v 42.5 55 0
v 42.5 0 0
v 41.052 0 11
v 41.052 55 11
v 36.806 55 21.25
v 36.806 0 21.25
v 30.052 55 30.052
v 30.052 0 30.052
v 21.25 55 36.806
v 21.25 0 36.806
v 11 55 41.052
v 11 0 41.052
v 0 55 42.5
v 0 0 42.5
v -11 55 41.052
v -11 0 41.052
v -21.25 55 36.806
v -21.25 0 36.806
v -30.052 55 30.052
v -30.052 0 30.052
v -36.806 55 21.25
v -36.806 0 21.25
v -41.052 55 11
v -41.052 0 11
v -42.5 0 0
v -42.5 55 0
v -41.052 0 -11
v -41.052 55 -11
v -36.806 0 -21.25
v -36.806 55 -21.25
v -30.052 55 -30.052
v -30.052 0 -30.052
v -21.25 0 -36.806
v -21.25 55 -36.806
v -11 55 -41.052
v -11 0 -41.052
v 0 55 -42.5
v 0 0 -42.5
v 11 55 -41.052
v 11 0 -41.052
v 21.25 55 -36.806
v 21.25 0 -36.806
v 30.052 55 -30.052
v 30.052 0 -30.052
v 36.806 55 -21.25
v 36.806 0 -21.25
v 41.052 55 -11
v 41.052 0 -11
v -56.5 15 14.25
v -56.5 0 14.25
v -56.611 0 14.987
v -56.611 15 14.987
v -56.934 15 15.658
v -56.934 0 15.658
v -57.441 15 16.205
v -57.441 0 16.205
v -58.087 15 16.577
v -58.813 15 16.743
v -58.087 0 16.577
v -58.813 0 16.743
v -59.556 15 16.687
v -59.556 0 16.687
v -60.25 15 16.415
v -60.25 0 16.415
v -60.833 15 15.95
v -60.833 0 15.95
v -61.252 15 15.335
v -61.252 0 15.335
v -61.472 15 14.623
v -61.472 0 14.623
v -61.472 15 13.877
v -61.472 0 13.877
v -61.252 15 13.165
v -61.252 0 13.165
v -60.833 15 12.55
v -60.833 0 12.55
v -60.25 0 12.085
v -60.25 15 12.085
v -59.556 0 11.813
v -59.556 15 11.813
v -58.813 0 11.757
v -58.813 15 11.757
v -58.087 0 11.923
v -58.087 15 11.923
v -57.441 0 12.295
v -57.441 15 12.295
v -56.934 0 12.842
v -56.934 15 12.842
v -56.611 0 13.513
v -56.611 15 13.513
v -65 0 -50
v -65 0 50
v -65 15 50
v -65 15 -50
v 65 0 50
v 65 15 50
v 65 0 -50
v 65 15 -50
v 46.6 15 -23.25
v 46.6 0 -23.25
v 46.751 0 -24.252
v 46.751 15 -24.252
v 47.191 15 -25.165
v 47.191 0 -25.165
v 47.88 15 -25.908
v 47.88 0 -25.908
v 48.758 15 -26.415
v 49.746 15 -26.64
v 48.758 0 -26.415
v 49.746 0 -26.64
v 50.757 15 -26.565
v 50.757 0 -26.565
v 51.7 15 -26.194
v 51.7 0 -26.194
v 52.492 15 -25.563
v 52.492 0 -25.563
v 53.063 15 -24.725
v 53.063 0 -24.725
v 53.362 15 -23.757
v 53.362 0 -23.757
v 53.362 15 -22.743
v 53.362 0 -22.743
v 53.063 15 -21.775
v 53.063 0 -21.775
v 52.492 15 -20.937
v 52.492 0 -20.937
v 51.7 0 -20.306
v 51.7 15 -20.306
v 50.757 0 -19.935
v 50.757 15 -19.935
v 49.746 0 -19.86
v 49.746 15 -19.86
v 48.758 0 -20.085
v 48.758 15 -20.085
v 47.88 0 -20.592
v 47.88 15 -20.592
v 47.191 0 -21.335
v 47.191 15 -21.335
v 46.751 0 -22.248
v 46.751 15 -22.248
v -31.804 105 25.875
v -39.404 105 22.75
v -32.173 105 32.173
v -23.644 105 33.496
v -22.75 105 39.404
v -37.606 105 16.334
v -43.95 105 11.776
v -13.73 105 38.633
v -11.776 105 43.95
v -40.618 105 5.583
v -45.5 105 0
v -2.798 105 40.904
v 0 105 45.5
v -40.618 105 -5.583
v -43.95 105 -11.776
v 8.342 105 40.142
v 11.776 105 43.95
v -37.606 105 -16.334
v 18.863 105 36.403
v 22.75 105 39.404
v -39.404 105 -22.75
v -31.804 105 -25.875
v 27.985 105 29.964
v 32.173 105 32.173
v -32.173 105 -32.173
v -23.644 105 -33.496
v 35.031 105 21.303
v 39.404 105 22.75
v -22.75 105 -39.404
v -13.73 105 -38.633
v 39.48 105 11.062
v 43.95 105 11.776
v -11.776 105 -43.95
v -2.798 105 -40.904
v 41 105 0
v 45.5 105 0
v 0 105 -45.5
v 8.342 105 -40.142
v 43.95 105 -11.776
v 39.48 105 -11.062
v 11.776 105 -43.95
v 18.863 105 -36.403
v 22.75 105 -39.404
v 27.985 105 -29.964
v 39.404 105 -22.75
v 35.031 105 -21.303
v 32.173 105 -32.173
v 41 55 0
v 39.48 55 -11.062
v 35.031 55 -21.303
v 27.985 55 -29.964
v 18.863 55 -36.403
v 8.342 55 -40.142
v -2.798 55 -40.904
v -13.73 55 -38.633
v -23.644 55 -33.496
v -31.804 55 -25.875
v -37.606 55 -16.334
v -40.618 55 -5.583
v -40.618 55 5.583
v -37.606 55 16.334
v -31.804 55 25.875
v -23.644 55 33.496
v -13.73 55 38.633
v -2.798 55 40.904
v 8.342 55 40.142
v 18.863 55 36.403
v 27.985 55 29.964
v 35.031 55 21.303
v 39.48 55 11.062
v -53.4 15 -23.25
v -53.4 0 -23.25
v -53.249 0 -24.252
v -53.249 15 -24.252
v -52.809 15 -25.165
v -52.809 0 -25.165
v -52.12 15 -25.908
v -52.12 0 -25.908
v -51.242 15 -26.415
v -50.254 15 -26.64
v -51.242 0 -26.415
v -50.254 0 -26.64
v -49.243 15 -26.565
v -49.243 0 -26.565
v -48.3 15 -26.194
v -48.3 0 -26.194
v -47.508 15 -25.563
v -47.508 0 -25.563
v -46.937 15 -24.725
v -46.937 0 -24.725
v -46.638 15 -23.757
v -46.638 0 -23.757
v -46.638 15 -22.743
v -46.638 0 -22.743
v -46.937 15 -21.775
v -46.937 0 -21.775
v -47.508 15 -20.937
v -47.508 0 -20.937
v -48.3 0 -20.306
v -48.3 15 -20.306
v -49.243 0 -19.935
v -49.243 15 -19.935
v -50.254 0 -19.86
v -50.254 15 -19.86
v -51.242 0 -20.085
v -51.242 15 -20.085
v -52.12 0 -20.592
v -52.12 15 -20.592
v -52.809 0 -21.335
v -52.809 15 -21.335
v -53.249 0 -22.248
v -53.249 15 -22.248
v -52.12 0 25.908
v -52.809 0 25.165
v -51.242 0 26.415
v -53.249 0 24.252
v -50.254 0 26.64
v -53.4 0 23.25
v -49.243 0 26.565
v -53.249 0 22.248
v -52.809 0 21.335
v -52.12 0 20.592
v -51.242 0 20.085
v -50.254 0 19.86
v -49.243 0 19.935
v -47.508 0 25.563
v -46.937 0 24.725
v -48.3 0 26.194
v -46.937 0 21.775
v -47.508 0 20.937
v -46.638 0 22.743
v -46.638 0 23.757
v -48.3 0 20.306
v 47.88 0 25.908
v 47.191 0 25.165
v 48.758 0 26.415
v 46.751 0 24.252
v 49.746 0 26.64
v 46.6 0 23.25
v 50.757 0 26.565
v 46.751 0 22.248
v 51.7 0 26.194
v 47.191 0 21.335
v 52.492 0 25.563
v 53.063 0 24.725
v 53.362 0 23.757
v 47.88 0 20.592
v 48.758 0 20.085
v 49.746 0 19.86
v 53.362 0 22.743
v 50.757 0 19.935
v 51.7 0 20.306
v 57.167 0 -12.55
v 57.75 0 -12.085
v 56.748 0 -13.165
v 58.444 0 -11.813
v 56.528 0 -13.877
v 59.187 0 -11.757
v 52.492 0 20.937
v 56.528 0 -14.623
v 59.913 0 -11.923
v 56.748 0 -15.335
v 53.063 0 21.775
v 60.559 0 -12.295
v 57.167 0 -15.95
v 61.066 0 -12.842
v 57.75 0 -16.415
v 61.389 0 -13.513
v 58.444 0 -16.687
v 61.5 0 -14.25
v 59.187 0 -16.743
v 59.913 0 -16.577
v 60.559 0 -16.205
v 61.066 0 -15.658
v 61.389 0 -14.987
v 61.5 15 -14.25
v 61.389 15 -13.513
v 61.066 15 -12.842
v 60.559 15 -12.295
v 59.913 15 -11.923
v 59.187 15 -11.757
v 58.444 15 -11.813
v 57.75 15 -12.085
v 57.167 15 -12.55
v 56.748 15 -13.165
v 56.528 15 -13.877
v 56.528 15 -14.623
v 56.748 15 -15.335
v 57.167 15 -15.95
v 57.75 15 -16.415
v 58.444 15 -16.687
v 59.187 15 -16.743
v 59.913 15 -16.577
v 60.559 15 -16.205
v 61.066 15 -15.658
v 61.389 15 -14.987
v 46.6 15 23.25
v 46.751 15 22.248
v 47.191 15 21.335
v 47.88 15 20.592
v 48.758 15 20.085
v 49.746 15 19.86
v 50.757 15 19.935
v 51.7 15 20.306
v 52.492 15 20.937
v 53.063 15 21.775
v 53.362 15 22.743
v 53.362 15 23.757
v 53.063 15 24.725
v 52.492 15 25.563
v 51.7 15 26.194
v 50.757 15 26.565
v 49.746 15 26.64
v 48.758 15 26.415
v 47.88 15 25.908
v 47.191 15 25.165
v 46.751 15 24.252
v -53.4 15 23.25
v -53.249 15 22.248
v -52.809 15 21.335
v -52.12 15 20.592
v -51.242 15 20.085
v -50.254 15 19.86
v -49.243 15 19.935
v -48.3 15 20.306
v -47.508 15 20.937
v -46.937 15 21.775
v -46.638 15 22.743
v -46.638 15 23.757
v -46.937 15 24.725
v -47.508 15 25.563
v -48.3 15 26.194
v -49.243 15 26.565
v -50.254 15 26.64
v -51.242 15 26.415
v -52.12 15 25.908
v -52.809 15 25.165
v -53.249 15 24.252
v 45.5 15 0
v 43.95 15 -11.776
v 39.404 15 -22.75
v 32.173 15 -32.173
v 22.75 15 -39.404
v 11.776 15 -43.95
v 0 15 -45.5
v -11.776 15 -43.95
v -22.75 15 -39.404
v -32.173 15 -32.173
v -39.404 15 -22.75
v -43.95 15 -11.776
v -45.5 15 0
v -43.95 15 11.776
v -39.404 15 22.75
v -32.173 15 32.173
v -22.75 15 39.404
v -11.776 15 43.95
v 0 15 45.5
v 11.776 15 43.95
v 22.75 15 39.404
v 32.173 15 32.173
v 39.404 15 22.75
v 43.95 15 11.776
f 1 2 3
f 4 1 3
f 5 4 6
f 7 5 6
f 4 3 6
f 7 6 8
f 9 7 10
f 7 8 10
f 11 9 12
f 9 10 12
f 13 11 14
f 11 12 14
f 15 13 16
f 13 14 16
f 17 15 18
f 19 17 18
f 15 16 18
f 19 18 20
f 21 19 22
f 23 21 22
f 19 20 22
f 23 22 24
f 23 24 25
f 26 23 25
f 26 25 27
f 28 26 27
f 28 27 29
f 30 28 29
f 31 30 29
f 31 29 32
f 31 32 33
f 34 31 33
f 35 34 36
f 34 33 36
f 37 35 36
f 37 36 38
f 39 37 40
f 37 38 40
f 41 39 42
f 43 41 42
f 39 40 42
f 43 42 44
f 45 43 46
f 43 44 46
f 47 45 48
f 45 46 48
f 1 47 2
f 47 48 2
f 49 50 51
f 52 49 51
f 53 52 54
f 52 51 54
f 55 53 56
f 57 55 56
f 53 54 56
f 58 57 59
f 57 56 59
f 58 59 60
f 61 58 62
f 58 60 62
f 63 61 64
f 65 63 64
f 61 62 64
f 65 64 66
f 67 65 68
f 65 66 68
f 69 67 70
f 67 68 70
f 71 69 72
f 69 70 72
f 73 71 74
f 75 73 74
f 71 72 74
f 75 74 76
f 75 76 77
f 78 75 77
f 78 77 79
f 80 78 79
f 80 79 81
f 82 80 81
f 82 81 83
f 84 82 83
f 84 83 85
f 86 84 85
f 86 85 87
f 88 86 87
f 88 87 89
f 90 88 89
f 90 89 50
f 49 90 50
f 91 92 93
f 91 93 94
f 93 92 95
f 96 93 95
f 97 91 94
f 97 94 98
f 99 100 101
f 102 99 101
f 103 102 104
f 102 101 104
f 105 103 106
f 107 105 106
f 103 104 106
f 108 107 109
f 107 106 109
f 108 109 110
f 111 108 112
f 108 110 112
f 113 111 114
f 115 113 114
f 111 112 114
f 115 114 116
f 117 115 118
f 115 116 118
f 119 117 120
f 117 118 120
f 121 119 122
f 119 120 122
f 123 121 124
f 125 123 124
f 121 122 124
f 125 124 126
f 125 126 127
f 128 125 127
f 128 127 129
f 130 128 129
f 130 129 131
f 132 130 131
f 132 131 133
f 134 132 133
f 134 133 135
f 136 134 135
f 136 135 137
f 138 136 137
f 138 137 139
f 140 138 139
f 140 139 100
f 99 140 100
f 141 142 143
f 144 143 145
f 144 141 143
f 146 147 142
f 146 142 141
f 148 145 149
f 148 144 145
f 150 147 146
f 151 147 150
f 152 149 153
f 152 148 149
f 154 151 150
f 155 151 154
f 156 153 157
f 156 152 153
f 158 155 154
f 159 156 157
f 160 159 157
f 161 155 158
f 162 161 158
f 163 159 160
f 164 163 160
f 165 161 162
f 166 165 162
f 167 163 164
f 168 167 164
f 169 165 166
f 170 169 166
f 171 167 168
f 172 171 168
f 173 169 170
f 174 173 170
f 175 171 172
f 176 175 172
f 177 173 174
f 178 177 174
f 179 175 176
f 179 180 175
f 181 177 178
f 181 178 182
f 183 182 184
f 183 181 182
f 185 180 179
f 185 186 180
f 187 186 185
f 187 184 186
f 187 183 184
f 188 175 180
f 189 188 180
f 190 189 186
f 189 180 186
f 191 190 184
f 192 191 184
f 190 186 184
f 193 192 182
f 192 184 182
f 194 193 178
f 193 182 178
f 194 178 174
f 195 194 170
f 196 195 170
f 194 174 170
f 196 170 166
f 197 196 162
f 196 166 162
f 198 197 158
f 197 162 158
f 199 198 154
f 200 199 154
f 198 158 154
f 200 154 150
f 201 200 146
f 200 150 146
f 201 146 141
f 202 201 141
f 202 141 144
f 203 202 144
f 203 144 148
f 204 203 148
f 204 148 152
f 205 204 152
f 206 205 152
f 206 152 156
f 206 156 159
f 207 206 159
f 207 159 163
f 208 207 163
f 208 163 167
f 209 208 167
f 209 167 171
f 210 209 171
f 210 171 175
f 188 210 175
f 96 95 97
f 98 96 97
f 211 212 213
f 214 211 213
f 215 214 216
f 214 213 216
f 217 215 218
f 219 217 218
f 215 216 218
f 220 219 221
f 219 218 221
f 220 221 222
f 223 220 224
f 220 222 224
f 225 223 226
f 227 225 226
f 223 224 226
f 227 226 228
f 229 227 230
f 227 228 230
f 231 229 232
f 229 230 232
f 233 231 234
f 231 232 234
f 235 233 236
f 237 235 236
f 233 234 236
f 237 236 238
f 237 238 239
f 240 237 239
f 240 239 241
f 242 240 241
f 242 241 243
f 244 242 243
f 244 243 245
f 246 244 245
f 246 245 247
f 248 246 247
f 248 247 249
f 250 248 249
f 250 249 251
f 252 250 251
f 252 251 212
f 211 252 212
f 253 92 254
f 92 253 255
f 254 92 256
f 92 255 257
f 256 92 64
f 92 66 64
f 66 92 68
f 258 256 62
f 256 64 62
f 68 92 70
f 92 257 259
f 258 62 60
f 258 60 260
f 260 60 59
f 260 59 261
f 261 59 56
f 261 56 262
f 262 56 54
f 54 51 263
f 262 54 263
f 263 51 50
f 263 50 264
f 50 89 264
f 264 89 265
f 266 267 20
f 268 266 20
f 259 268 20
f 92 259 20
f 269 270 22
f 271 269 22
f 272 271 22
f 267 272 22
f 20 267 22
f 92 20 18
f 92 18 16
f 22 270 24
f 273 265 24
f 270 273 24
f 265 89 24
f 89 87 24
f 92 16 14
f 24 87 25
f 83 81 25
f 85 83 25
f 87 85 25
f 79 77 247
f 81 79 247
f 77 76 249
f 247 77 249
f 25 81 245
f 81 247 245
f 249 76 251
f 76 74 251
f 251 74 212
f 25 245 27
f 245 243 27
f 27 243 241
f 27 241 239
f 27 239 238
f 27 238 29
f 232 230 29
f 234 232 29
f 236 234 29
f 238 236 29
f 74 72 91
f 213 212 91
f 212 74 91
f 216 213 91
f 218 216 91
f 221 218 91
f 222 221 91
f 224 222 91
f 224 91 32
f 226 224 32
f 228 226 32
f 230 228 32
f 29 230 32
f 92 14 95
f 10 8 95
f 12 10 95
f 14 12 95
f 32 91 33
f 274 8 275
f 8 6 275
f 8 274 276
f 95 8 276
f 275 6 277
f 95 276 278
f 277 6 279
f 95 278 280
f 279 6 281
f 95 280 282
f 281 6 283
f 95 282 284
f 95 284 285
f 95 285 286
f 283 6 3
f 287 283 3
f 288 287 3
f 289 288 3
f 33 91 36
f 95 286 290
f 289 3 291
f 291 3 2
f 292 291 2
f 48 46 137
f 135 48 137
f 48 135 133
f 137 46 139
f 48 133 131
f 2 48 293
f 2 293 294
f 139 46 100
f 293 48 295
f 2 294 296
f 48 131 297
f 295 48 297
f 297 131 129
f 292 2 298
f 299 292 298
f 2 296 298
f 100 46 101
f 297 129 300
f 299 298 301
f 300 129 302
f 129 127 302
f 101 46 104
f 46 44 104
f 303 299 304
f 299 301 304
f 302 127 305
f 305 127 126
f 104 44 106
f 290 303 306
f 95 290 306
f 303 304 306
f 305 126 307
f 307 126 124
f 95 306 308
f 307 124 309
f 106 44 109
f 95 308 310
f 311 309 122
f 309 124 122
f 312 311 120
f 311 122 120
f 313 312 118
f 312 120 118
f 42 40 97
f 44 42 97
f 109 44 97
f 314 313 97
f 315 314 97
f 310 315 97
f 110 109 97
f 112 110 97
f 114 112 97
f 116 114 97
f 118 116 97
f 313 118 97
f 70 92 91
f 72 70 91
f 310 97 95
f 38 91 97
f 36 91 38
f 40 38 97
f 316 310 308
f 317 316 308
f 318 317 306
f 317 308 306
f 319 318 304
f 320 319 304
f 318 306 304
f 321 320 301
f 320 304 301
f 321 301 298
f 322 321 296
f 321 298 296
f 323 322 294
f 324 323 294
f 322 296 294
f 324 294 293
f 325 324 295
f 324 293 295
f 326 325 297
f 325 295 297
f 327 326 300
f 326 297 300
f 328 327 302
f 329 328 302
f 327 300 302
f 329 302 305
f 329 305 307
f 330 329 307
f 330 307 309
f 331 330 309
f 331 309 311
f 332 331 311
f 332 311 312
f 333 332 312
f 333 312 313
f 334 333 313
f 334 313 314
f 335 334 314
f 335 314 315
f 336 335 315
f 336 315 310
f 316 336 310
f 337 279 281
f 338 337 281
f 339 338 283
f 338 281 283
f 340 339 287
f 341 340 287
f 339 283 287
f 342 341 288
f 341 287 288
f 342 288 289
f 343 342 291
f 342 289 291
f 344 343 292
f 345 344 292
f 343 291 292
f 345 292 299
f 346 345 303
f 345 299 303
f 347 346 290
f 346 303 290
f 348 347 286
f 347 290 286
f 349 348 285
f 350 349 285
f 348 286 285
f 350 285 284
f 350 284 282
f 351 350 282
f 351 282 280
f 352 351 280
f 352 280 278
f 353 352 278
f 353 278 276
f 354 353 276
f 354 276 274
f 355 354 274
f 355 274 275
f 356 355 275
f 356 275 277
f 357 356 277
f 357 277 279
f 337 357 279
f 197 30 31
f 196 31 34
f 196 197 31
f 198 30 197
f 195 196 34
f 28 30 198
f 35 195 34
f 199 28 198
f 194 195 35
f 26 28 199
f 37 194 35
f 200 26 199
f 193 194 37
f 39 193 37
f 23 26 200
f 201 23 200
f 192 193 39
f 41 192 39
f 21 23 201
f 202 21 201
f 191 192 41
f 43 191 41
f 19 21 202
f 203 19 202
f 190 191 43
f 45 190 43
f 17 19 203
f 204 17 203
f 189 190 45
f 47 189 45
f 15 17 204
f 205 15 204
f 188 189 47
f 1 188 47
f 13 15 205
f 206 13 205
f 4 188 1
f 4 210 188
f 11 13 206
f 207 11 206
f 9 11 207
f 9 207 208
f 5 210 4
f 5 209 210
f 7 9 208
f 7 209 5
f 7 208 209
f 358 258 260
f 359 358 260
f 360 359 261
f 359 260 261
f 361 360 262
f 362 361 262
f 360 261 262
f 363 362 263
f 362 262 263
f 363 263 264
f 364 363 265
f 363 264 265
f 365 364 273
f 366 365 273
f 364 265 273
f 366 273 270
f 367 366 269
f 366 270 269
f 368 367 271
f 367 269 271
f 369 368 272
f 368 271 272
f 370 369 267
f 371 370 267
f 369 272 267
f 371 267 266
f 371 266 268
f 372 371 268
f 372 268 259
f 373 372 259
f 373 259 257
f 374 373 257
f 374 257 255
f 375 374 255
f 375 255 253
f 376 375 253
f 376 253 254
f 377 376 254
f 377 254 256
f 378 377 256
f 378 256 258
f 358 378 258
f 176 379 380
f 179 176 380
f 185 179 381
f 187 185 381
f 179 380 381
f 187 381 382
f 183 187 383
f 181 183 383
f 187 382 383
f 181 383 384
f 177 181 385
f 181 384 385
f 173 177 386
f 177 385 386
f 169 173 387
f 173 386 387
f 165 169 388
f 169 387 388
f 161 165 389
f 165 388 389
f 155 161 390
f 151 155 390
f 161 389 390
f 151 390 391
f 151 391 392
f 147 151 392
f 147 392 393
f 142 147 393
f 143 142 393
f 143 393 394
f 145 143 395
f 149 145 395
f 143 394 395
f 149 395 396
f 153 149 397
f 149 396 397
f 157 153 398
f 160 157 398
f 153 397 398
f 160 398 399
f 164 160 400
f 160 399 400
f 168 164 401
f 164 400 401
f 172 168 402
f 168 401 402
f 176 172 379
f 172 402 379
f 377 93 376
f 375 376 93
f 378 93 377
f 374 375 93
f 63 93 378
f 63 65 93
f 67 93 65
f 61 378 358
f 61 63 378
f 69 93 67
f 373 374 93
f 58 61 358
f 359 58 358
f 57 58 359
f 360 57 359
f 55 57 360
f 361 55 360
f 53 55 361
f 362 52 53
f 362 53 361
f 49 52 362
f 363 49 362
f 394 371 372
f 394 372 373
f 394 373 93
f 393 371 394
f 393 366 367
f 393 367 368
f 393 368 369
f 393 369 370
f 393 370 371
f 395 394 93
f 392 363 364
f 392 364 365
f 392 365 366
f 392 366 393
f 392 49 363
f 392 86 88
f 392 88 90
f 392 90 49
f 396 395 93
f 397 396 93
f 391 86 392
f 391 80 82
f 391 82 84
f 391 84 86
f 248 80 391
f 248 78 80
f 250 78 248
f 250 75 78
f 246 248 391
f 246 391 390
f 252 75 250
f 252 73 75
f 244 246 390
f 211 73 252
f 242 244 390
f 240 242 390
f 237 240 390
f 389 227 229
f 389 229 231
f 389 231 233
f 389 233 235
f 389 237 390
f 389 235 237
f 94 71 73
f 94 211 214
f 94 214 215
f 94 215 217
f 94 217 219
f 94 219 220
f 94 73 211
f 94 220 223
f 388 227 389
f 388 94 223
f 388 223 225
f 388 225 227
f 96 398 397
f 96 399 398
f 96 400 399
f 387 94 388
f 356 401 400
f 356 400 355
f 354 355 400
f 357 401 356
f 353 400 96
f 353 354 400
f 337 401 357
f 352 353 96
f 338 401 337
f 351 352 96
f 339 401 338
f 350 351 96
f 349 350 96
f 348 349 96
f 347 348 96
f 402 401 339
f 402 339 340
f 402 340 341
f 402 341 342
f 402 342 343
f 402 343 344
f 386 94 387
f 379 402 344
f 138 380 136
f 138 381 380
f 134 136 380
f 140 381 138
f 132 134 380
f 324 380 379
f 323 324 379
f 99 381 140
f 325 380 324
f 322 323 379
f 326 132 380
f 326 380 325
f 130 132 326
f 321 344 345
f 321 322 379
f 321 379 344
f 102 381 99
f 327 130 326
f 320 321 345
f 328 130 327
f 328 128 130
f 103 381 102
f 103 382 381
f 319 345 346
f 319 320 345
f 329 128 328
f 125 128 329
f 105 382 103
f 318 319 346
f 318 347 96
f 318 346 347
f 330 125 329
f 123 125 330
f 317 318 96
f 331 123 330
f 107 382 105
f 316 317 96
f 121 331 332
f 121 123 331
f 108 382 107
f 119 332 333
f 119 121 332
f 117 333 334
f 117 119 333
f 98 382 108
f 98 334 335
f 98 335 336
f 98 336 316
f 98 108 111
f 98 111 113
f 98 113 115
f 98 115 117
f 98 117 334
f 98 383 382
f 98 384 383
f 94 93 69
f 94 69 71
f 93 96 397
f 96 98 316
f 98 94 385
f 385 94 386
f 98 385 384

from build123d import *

# Parameters (mm, degrees)
SKETCH1_W             = 130
SKETCH1_H             = 100
BOSS_EXTRUDE1_DEPTH   = 15
SKETCH2_R             = 45.5
BOSS_EXTRUDE2_DEPTH   = 90
SKETCH3_R             = 41
CUT_EXTRUDE1_DEPTH    = 106
SKETCH4_R             = 42.5
CUT_EXTRUDE2_DEPTH    = 55
M8_TAPPED_HOLE1_D     = 6.8
M8_TAPPED_HOLE1_DEPTH = 17.707073895
M8_TAPPED_HOLE1_TIP   = 2.042926105
SKETCH11_R            = 2.5
CUT_EXTRUDE3_DEPTH    = 106


with BuildPart() as part:
    # Sketch1 → Boss-Extrude1 (new body)
    with BuildSketch(Plane(origin=(0, 0, 0), x_dir=(1, 0, 0), z_dir=(0, 1, 0))):
        Rectangle(SKETCH1_W, SKETCH1_H)
    extrude(amount=BOSS_EXTRUDE1_DEPTH)

    # Sketch2 → Boss-Extrude2 (add)
    with BuildSketch(Plane(origin=(0, 15, 0), x_dir=(1, 0, 0), z_dir=(0, 1, 0))):
        Circle(SKETCH2_R)
    extrude(amount=BOSS_EXTRUDE2_DEPTH)

    # Sketch3 → Cut-Extrude1 (cut, through all)
    with BuildSketch(Plane(origin=(0, 105, 0), x_dir=(1, 0, 0), z_dir=(0, 1, 0))):
        Circle(SKETCH3_R)
    extrude(amount=-CUT_EXTRUDE1_DEPTH, mode=Mode.SUBTRACT)

    # Sketch4 → Cut-Extrude2 (cut)
    with BuildSketch(Plane.XZ):
        Circle(SKETCH4_R)
    extrude(amount=-CUT_EXTRUDE2_DEPTH, mode=Mode.SUBTRACT)

    # M8 Tapped Hole1
    with Locations(Plane(origin=(0, 15, 0), x_dir=(1, 0, 0), z_dir=(0, 1, 0))):
        with Locations((-50, 23.25), (-50, -23.25), (50, -23.25), (50, 23.25)):
            Hole(M8_TAPPED_HOLE1_D / 2, depth=M8_TAPPED_HOLE1_DEPTH)
            with Locations((0, 0, -(M8_TAPPED_HOLE1_DEPTH + M8_TAPPED_HOLE1_TIP / 2))):  # 118° drill point
                Cone(0, M8_TAPPED_HOLE1_D / 2, M8_TAPPED_HOLE1_TIP, mode=Mode.SUBTRACT)

    # Sketch11 → Cut-Extrude3 (cut, through all)
    with BuildSketch(Plane.XZ):
        with Locations((-59, 14.25)):
            Circle(SKETCH11_R)
        with Locations((59, -14.25)):
            Circle(SKETCH11_R)
    extrude(amount=-CUT_EXTRUDE3_DEPTH, mode=Mode.SUBTRACT)


solid = part.part
